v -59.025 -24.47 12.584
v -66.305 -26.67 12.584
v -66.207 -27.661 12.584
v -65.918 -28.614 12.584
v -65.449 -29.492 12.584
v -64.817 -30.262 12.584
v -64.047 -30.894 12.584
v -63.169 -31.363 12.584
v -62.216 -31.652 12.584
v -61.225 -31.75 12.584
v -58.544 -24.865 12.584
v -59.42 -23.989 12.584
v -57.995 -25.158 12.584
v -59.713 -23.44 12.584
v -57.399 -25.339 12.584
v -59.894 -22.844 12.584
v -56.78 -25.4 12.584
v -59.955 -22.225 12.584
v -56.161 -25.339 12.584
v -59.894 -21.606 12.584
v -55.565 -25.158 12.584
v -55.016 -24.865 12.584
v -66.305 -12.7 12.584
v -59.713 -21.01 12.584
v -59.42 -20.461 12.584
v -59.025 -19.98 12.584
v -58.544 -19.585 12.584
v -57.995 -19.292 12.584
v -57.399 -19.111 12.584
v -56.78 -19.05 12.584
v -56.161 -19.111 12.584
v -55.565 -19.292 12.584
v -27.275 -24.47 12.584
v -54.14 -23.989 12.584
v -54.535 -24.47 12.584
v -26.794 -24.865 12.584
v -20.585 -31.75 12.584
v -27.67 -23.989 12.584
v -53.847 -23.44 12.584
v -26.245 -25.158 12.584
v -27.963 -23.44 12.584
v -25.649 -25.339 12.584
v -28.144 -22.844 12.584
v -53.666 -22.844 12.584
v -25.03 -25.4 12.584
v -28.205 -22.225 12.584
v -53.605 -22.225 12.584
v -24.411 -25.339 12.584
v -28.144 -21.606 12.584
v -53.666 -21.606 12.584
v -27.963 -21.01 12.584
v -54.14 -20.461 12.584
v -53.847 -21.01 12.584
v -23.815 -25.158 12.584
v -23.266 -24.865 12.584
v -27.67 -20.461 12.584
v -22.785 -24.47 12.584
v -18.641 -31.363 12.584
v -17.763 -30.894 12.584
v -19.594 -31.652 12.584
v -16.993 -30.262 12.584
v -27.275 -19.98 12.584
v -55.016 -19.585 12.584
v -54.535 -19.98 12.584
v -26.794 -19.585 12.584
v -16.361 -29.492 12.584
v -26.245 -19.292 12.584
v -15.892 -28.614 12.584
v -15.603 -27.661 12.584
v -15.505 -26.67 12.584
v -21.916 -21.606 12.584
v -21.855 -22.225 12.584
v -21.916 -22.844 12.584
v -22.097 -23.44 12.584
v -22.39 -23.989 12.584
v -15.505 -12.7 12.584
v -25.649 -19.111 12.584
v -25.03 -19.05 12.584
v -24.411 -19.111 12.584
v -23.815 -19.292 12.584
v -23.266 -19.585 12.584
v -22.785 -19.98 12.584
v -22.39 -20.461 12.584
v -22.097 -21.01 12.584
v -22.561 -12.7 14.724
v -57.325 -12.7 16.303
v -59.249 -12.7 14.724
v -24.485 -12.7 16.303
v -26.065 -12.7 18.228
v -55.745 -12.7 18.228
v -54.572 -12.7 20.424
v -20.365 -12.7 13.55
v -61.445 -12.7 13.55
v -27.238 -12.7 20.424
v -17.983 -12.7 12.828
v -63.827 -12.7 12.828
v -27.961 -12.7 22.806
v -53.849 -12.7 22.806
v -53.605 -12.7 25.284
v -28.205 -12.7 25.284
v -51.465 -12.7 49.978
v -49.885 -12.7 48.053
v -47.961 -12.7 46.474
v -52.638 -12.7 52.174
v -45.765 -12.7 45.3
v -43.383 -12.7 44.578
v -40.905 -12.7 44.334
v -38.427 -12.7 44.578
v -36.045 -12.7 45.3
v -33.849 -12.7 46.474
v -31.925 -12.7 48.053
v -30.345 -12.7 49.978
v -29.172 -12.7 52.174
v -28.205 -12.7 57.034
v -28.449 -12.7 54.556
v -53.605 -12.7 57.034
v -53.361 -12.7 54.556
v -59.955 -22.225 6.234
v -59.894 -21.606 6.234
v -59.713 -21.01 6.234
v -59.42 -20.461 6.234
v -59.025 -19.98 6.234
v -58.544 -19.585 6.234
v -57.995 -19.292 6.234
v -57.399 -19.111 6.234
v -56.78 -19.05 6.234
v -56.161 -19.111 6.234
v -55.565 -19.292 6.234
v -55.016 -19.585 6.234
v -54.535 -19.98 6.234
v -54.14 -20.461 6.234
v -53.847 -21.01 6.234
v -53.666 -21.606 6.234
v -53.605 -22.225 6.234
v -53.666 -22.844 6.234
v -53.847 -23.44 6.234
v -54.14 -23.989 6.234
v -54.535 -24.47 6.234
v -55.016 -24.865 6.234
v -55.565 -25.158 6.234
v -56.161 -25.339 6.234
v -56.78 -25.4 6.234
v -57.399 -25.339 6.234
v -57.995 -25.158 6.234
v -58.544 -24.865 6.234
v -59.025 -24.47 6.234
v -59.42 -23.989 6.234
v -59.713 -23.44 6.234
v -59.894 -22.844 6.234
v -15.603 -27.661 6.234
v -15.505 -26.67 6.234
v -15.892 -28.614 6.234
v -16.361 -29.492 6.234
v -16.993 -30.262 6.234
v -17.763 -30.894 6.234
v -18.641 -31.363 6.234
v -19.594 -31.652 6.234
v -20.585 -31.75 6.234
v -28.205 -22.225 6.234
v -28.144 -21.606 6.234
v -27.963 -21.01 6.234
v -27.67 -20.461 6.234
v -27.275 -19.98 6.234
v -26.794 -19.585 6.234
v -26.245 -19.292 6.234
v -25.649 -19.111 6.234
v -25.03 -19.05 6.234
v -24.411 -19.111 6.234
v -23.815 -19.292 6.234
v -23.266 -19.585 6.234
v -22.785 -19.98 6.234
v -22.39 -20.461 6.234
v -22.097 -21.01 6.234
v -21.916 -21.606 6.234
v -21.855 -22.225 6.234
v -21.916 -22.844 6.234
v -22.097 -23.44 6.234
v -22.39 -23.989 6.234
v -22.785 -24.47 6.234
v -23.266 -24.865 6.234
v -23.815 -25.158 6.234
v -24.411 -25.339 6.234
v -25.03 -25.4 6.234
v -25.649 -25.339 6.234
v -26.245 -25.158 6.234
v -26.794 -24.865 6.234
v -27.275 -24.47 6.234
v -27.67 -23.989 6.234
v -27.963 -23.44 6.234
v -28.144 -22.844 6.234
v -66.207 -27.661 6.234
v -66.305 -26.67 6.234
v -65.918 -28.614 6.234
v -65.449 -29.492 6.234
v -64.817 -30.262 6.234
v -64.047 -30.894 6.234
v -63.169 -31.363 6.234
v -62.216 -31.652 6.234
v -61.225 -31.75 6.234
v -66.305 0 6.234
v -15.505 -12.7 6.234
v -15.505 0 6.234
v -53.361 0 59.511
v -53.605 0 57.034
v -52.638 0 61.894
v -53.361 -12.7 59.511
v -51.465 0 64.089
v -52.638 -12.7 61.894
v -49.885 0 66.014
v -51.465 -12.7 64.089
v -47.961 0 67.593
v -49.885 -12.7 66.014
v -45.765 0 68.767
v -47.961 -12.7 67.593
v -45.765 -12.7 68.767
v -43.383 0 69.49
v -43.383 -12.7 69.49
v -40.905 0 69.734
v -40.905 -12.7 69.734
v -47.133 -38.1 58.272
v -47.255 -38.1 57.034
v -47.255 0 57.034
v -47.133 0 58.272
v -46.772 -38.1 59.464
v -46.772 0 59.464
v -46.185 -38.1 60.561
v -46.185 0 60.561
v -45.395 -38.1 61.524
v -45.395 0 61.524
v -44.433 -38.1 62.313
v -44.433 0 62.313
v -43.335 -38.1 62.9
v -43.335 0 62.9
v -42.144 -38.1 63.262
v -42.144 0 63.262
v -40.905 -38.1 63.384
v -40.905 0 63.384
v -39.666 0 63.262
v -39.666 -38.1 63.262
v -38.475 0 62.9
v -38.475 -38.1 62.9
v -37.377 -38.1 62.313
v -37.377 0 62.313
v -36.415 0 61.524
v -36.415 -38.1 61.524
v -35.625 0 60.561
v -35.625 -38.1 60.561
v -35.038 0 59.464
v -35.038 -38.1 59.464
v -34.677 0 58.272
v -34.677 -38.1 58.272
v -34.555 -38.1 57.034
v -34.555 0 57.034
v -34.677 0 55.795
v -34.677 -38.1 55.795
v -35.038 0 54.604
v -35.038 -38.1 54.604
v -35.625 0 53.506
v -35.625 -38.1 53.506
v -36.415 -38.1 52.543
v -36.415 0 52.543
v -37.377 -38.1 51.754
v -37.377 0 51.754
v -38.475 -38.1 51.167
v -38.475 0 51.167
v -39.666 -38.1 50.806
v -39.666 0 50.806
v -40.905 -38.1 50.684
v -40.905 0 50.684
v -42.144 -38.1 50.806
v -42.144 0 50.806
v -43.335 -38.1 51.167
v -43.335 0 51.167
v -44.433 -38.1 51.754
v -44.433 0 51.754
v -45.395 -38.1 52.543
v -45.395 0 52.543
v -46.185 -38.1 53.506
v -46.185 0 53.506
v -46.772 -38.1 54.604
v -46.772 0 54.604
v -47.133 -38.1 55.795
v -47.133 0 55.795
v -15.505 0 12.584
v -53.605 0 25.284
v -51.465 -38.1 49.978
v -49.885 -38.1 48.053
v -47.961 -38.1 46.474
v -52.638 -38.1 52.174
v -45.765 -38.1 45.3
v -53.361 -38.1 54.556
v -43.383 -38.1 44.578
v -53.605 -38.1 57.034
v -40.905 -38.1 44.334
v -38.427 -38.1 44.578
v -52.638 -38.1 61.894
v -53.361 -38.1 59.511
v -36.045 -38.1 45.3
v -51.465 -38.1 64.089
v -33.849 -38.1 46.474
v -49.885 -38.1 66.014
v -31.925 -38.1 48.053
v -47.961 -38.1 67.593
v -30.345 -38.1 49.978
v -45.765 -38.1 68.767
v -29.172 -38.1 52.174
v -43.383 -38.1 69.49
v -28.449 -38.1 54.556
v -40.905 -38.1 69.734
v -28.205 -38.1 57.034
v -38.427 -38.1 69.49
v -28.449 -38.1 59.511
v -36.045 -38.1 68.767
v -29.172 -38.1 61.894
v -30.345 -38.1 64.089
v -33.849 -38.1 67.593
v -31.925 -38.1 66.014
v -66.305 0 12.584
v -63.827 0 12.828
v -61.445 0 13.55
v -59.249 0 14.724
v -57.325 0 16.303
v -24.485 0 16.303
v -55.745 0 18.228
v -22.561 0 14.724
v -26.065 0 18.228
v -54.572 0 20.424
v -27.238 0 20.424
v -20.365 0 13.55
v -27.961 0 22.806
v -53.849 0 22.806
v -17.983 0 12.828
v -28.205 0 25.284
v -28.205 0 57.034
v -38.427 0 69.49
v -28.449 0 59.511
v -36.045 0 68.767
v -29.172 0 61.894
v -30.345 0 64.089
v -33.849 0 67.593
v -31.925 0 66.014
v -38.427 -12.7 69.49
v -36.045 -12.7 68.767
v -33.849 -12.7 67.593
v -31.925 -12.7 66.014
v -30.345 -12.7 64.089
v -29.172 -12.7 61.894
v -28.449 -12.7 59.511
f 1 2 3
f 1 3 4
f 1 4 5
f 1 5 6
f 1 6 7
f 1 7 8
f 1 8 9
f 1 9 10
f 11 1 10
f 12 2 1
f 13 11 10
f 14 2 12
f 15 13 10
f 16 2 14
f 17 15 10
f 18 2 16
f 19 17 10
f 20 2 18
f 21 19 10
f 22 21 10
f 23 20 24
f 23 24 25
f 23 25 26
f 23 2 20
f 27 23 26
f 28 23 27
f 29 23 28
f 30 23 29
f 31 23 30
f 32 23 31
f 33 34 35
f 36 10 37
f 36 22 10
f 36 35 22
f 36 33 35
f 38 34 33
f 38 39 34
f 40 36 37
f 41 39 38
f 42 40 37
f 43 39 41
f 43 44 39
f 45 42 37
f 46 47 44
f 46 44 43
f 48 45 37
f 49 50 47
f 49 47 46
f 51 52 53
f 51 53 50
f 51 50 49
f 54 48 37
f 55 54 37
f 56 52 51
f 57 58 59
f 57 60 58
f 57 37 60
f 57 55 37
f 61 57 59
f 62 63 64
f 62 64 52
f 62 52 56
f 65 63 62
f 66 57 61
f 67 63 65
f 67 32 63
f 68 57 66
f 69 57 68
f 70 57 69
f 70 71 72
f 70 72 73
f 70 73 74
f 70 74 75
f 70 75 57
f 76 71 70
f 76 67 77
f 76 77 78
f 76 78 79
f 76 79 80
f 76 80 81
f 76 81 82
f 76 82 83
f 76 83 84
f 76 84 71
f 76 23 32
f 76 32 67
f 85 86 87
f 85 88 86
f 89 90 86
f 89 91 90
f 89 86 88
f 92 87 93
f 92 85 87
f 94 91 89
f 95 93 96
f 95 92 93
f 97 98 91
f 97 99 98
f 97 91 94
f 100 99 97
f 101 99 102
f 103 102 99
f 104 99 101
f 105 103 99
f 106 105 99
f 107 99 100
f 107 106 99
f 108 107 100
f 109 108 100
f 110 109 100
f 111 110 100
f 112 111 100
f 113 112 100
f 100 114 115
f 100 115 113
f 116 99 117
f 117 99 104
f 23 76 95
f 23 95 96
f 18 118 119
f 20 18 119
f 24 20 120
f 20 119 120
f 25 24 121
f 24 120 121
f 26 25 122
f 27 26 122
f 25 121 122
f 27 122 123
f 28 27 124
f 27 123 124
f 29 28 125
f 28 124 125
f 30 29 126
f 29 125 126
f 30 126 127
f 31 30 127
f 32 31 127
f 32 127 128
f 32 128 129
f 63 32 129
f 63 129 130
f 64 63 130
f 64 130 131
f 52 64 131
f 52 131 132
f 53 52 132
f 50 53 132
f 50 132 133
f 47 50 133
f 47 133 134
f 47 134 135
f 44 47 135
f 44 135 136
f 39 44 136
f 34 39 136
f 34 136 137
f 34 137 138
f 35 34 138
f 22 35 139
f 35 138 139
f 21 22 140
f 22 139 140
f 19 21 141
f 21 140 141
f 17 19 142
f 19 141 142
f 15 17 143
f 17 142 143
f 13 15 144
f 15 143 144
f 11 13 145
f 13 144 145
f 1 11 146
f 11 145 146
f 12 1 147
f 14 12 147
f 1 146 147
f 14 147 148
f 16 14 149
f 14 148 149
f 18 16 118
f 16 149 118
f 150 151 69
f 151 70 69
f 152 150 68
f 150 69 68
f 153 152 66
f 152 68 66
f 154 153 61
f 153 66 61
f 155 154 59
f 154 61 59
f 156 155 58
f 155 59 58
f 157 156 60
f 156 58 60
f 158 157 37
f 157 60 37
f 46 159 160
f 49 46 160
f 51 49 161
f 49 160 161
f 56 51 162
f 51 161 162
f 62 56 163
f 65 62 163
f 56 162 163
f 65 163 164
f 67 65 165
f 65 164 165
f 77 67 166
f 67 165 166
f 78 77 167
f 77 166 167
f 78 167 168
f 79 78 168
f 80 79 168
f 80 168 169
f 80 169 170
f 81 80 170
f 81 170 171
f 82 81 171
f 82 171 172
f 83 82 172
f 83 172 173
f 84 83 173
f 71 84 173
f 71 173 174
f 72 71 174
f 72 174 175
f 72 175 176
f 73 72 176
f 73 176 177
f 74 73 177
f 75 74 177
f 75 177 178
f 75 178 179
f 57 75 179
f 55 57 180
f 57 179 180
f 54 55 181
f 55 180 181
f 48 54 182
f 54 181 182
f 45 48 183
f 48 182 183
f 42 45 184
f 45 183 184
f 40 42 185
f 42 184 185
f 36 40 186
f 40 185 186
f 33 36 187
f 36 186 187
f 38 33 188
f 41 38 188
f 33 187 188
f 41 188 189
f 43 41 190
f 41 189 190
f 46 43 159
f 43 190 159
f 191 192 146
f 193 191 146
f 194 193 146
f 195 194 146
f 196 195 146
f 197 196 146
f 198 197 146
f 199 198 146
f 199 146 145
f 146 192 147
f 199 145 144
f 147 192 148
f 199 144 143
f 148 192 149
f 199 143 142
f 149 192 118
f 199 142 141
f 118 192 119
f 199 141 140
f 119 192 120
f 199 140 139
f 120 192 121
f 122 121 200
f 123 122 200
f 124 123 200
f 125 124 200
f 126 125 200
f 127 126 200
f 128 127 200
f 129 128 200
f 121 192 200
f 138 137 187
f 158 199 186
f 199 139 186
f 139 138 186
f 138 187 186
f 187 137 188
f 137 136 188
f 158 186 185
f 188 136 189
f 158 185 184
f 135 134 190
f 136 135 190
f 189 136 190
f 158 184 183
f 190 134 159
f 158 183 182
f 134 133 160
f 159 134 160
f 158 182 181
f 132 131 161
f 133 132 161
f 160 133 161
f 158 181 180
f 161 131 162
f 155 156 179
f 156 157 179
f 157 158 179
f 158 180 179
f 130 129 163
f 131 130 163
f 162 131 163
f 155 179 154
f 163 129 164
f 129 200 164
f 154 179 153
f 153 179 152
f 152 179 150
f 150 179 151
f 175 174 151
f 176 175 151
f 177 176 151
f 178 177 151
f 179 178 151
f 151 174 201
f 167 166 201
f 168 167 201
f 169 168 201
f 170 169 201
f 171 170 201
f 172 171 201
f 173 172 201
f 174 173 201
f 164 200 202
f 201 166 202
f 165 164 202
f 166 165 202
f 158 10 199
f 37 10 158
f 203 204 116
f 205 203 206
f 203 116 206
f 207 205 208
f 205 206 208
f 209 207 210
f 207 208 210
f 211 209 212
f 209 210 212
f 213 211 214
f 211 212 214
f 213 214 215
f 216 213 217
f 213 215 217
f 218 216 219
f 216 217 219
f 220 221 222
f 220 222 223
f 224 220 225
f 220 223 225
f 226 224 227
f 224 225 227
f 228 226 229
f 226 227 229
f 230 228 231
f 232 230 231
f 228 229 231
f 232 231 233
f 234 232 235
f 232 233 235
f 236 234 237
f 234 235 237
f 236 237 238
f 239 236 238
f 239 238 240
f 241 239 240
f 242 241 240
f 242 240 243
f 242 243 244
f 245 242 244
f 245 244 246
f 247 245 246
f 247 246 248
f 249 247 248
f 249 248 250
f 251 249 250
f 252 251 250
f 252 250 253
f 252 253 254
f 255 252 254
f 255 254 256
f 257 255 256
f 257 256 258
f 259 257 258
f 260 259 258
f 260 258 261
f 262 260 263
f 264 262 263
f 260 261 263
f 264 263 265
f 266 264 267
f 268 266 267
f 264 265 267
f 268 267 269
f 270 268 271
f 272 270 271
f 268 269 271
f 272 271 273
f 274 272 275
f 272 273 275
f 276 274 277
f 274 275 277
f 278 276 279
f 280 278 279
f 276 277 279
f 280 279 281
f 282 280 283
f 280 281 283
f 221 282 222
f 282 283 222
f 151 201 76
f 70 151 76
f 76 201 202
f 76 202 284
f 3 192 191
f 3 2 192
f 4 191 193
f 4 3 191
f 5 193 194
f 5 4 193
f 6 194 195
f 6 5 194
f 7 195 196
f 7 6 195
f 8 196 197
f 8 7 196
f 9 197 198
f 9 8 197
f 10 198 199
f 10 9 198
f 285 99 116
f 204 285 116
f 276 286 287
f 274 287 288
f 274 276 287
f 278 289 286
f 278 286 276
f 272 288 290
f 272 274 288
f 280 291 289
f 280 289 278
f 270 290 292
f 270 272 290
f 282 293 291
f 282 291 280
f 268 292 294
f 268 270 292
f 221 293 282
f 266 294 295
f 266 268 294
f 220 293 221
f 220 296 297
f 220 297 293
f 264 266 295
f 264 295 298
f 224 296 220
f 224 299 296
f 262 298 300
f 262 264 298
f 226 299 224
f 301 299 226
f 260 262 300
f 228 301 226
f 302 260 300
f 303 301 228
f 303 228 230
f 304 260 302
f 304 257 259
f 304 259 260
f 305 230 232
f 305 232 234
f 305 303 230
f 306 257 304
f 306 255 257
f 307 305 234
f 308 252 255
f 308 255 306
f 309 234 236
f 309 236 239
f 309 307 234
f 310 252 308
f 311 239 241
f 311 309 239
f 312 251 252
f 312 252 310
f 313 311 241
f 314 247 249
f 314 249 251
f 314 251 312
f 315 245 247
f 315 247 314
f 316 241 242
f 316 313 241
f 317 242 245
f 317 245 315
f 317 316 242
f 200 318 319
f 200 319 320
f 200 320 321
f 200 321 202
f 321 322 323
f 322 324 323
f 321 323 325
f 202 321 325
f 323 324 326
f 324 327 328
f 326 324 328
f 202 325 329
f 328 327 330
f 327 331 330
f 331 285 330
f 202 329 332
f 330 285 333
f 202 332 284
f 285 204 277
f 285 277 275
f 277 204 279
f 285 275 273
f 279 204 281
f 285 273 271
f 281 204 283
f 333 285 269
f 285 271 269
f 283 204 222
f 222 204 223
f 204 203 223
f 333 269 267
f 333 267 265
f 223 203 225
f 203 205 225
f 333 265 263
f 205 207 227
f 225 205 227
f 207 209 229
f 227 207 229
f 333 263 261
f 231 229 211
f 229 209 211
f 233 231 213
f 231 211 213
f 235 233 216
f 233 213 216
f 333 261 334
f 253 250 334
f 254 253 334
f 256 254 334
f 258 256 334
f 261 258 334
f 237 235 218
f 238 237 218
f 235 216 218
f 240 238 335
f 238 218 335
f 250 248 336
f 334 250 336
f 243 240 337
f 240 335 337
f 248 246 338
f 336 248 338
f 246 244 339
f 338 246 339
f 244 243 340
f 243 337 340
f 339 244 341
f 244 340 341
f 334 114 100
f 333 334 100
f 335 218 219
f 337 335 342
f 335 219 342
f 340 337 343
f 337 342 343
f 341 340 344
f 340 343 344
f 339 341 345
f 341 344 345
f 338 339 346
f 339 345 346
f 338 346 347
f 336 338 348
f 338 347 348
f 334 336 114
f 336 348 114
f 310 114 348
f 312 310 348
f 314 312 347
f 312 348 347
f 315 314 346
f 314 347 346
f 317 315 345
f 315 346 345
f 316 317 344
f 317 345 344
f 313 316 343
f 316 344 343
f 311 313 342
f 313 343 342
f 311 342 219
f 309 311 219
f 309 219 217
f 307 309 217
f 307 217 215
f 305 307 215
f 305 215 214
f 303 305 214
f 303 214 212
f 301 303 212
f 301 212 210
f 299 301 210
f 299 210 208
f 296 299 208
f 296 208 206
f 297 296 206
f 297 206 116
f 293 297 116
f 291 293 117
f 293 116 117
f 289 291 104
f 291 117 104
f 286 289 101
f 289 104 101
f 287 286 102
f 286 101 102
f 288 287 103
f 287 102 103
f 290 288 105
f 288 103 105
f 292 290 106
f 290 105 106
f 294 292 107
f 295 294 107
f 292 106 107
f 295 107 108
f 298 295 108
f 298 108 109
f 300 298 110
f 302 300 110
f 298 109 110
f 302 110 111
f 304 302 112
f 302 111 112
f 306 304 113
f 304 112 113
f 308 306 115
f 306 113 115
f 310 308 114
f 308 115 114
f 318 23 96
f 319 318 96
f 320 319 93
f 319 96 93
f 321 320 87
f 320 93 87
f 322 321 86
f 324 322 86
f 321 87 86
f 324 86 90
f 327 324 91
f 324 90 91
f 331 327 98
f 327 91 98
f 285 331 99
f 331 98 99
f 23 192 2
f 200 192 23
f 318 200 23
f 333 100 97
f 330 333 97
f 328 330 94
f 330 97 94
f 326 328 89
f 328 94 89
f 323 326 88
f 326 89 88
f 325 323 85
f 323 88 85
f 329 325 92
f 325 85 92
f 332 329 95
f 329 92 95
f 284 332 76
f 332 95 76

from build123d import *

# Parameters (mm, degrees)
F0_W     = 50.8
F0_H     = 52.8410717415
F0_H_2   = 10.6589282585
F1_DEPTH = 12.7
F2_W     = 50.8
F2_H     = 6.35
F3_DEPTH = 19.05
F5_DEPTH = 25.4
F7_DEPTH = 25.4
F9_D     = 12.7
F10_R    = 5.08
F12_D    = 6.35


with BuildPart() as f1:
    # F0 (on Front) → F1 (new body)
    with BuildSketch(Plane.XZ):
        with Locations((-40.9050544952, 43.3130595229)):
            Rectangle(F0_W, F0_H)
        with Locations((-40.9050544952, 11.5630595229)):
            Rectangle(F0_W, F0_H_2)
    extrude(amount=F1_DEPTH)

    # F2 (on face) → F3 (join)
    with BuildSketch(Plane.XZ.offset(12.7)):
        with Locations((-40.9050544952, 9.4085953936)):
            Rectangle(F2_W, F2_H)
    extrude(amount=F3_DEPTH)

    # F4 (on face) → F5 (cut)
    with BuildSketch(Plane.XZ.offset(12.7)):
        with BuildLine():
            Line((-53.6050544952, 25.2835953936), (-53.6050544952, 57.0335953936))
            ThreePointArc((-53.6050544952, 57.0335953936), (-49.8853106163, 66.0138515147), (-40.9050544952, 69.7335953936))
            Line((-40.9050544952, 69.7335953936), (-66.3050544952, 69.7335953936))
            Line((-66.3050544952, 69.7335953936), (-66.3050544952, 12.5835953936))
            ThreePointArc((-66.3050544952, 12.5835953936), (-57.3247983741, 16.3033392725), (-53.6050544952, 25.2835953936))
        make_face()
        with BuildLine():
            ThreePointArc((-40.9050544952, 69.7335953936), (-31.9247983741, 66.0138515147), (-28.2050544952, 57.0335953936))
            Line((-28.2050544952, 57.0335953936), (-28.2050544952, 25.2835953936))
            ThreePointArc((-28.2050544952, 25.2835953936), (-24.4853106163, 16.3033392725), (-15.5050544952, 12.5835953936))
            Line((-15.5050544952, 12.5835953936), (-15.5050544952, 69.7335953936))
            Line((-15.5050544952, 69.7335953936), (-40.9050544952, 69.7335953936))
        make_face()
    extrude(amount=-F5_DEPTH, mode=Mode.SUBTRACT)

    # F6 (on face) → F7 (join)
    with BuildSketch(Plane.XZ.offset(12.7)):
        with BuildLine():
            ThreePointArc((-53.6050544952, 57.0335953936), (-40.9050544952, 44.3335953936), (-28.2050544952, 57.0335953936))
            ThreePointArc((-28.2050544952, 57.0335953936), (-40.9050544952, 69.7335953936), (-53.6050544952, 57.0335953936))
        make_face()
    extrude(amount=F7_DEPTH)

    # F9 (through all)
    with Locations(Plane.XZ.offset(38.1)):
        with Locations((-40.9050544952, 57.0335953936)):
            Hole(F9_D / 2)

    # F10
    f10_edges = [f1.edges().sort_by_distance(p)[0] for p in [
        (-66.305054, -31.75, 9.408595),
        (-15.505054, -31.75, 9.408595),
    ]]
    fillet(f10_edges, radius=F10_R)

    # F12 (through all)
    with Locations(Plane.XY.offset(12.5835953936)):
        with Locations((-56.7800544952, -22.225), (-25.0300544952, -22.225)):
            Hole(F12_D / 2)


solid = f1.part
